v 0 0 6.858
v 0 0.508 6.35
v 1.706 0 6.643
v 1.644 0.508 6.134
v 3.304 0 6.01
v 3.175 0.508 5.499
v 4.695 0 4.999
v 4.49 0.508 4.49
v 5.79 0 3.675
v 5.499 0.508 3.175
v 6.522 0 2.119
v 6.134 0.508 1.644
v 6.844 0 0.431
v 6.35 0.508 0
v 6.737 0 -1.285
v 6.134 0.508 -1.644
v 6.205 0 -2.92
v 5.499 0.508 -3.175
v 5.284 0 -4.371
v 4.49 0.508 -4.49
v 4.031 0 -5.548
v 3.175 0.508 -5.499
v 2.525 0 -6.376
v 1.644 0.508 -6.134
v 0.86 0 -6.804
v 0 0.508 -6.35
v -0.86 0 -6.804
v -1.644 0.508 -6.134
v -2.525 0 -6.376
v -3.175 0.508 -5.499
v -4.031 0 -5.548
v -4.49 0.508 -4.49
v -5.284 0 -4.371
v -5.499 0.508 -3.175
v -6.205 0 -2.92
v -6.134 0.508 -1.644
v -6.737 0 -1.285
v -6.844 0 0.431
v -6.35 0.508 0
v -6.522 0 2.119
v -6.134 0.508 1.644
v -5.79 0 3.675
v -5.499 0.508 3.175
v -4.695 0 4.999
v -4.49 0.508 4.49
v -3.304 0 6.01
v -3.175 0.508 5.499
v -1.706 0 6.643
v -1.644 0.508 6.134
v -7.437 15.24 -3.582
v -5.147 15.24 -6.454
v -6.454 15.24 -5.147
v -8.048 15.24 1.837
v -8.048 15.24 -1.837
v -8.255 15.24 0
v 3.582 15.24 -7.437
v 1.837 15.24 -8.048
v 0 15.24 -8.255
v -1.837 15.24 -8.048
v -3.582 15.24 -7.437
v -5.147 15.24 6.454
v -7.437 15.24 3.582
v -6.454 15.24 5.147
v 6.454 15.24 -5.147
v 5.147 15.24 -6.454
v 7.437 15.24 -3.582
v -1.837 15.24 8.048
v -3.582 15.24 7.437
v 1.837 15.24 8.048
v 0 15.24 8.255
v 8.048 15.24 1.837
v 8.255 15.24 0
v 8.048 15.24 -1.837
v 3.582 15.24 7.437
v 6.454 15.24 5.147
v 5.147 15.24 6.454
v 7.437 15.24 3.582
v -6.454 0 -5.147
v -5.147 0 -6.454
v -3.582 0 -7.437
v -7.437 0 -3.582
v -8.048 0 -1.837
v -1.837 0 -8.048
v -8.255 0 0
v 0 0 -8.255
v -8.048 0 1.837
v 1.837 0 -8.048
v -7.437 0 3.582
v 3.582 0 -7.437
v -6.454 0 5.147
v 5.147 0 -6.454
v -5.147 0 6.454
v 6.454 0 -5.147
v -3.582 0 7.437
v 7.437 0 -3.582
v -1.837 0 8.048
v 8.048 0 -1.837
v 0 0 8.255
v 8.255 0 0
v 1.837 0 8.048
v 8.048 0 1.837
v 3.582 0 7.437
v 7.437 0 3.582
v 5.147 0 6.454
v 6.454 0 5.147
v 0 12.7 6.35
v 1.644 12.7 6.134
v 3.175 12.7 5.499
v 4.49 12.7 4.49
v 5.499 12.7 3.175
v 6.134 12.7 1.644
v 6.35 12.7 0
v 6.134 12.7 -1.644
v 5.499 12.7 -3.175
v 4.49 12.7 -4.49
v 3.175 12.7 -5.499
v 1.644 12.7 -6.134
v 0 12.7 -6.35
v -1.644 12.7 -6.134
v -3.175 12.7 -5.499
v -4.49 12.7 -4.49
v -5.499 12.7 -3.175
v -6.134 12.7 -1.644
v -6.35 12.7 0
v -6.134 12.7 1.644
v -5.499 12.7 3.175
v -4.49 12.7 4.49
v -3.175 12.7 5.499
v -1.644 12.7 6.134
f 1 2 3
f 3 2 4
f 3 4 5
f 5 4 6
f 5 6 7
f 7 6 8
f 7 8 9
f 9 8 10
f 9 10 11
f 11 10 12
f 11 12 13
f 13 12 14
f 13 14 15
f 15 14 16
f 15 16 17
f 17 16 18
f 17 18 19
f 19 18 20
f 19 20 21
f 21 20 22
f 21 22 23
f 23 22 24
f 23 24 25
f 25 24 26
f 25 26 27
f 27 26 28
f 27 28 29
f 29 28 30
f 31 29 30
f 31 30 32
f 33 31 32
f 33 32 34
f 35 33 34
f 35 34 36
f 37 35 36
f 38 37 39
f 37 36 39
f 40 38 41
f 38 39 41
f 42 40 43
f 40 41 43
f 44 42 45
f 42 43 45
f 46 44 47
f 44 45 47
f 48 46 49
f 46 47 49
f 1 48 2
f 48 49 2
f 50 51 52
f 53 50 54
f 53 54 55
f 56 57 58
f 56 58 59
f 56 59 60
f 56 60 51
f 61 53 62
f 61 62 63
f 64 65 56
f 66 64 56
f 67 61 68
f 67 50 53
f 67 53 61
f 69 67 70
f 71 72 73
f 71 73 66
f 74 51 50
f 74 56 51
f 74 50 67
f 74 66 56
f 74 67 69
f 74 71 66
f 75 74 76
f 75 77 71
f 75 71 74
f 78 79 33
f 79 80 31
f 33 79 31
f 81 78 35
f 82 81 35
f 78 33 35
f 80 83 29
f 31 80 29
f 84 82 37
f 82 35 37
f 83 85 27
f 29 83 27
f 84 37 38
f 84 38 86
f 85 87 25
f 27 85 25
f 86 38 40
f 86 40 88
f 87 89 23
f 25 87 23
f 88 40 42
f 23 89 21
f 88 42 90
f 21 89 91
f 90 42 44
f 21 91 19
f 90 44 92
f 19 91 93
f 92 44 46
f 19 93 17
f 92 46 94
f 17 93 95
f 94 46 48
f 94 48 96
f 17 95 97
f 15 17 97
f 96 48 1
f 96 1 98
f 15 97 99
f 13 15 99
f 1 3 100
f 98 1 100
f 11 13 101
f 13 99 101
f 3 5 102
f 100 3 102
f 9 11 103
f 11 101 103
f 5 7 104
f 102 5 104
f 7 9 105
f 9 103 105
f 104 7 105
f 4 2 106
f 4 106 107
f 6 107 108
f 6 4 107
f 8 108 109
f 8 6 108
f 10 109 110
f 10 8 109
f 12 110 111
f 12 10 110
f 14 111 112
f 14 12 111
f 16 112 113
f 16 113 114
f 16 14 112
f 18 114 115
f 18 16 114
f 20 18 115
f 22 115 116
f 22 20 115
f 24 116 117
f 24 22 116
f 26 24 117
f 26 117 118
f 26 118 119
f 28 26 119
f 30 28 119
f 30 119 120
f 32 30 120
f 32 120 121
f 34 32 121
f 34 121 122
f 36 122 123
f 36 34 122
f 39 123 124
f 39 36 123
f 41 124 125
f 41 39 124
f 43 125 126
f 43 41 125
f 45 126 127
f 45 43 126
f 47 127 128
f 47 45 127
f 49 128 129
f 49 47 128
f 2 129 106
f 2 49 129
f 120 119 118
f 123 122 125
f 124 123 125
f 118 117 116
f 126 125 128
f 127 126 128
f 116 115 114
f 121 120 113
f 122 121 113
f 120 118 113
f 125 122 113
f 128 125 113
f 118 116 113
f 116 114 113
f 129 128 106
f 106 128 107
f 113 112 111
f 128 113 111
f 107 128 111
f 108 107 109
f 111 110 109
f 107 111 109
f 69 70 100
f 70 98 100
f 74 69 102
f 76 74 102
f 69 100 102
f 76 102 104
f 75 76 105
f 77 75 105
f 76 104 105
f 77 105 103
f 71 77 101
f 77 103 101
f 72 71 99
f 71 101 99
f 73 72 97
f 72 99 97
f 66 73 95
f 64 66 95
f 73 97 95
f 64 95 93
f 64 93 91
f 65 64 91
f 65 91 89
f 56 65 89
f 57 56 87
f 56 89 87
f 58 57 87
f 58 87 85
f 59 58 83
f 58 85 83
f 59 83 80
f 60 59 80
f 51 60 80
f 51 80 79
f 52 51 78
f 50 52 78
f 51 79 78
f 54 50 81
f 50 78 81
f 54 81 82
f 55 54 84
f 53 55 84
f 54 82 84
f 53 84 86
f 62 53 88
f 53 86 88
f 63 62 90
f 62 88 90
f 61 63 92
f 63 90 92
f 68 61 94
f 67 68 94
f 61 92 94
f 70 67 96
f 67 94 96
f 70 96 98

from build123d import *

# Parameters (mm, degrees)
SKETCH1_R           = 8.255
SKETCH1_R_2         = 6.35
BOSS_EXTRUDE1_DEPTH = 12.7
SKETCH2_R           = 8.255
BOSS_EXTRUDE2_DEPTH = 2.54
CHAMFER1_SIZE       = 0.508


with BuildPart() as part:
    # Sketch1 → Boss-Extrude1 (new body)
    with BuildSketch(Plane(origin=(0, 0, 0), x_dir=(1, 0, 0), z_dir=(0, 1, 0))):
        with Locations(Location((0, 0, 0), (0, 0, 270))):  # turned: the seam where the file's is
            Circle(SKETCH1_R)
        with Locations(Location((0, 0, 0), (0, 0, 270))):  # turned: the seam where the file's is
            Circle(SKETCH1_R_2, mode=Mode.SUBTRACT)
    extrude(amount=BOSS_EXTRUDE1_DEPTH)

    # Sketch2 → Boss-Extrude2 (add)
    with BuildSketch(Plane(origin=(0, 12.7, 0), x_dir=(1, 0, 0), z_dir=(0, 1, 0))):
        with Locations(Location((0, 0, 0), (0, 0, 270))):  # turned: the seam where the file's is
            Circle(SKETCH2_R)
    extrude(amount=BOSS_EXTRUDE2_DEPTH)

    # Chamfer1
    chamfer1_edges = [part.edges().sort_by_distance(p)[0] for p in [
        (0, 0, -6.35),
    ]]
    chamfer(chamfer1_edges, length=CHAMFER1_SIZE)


solid = part.part
